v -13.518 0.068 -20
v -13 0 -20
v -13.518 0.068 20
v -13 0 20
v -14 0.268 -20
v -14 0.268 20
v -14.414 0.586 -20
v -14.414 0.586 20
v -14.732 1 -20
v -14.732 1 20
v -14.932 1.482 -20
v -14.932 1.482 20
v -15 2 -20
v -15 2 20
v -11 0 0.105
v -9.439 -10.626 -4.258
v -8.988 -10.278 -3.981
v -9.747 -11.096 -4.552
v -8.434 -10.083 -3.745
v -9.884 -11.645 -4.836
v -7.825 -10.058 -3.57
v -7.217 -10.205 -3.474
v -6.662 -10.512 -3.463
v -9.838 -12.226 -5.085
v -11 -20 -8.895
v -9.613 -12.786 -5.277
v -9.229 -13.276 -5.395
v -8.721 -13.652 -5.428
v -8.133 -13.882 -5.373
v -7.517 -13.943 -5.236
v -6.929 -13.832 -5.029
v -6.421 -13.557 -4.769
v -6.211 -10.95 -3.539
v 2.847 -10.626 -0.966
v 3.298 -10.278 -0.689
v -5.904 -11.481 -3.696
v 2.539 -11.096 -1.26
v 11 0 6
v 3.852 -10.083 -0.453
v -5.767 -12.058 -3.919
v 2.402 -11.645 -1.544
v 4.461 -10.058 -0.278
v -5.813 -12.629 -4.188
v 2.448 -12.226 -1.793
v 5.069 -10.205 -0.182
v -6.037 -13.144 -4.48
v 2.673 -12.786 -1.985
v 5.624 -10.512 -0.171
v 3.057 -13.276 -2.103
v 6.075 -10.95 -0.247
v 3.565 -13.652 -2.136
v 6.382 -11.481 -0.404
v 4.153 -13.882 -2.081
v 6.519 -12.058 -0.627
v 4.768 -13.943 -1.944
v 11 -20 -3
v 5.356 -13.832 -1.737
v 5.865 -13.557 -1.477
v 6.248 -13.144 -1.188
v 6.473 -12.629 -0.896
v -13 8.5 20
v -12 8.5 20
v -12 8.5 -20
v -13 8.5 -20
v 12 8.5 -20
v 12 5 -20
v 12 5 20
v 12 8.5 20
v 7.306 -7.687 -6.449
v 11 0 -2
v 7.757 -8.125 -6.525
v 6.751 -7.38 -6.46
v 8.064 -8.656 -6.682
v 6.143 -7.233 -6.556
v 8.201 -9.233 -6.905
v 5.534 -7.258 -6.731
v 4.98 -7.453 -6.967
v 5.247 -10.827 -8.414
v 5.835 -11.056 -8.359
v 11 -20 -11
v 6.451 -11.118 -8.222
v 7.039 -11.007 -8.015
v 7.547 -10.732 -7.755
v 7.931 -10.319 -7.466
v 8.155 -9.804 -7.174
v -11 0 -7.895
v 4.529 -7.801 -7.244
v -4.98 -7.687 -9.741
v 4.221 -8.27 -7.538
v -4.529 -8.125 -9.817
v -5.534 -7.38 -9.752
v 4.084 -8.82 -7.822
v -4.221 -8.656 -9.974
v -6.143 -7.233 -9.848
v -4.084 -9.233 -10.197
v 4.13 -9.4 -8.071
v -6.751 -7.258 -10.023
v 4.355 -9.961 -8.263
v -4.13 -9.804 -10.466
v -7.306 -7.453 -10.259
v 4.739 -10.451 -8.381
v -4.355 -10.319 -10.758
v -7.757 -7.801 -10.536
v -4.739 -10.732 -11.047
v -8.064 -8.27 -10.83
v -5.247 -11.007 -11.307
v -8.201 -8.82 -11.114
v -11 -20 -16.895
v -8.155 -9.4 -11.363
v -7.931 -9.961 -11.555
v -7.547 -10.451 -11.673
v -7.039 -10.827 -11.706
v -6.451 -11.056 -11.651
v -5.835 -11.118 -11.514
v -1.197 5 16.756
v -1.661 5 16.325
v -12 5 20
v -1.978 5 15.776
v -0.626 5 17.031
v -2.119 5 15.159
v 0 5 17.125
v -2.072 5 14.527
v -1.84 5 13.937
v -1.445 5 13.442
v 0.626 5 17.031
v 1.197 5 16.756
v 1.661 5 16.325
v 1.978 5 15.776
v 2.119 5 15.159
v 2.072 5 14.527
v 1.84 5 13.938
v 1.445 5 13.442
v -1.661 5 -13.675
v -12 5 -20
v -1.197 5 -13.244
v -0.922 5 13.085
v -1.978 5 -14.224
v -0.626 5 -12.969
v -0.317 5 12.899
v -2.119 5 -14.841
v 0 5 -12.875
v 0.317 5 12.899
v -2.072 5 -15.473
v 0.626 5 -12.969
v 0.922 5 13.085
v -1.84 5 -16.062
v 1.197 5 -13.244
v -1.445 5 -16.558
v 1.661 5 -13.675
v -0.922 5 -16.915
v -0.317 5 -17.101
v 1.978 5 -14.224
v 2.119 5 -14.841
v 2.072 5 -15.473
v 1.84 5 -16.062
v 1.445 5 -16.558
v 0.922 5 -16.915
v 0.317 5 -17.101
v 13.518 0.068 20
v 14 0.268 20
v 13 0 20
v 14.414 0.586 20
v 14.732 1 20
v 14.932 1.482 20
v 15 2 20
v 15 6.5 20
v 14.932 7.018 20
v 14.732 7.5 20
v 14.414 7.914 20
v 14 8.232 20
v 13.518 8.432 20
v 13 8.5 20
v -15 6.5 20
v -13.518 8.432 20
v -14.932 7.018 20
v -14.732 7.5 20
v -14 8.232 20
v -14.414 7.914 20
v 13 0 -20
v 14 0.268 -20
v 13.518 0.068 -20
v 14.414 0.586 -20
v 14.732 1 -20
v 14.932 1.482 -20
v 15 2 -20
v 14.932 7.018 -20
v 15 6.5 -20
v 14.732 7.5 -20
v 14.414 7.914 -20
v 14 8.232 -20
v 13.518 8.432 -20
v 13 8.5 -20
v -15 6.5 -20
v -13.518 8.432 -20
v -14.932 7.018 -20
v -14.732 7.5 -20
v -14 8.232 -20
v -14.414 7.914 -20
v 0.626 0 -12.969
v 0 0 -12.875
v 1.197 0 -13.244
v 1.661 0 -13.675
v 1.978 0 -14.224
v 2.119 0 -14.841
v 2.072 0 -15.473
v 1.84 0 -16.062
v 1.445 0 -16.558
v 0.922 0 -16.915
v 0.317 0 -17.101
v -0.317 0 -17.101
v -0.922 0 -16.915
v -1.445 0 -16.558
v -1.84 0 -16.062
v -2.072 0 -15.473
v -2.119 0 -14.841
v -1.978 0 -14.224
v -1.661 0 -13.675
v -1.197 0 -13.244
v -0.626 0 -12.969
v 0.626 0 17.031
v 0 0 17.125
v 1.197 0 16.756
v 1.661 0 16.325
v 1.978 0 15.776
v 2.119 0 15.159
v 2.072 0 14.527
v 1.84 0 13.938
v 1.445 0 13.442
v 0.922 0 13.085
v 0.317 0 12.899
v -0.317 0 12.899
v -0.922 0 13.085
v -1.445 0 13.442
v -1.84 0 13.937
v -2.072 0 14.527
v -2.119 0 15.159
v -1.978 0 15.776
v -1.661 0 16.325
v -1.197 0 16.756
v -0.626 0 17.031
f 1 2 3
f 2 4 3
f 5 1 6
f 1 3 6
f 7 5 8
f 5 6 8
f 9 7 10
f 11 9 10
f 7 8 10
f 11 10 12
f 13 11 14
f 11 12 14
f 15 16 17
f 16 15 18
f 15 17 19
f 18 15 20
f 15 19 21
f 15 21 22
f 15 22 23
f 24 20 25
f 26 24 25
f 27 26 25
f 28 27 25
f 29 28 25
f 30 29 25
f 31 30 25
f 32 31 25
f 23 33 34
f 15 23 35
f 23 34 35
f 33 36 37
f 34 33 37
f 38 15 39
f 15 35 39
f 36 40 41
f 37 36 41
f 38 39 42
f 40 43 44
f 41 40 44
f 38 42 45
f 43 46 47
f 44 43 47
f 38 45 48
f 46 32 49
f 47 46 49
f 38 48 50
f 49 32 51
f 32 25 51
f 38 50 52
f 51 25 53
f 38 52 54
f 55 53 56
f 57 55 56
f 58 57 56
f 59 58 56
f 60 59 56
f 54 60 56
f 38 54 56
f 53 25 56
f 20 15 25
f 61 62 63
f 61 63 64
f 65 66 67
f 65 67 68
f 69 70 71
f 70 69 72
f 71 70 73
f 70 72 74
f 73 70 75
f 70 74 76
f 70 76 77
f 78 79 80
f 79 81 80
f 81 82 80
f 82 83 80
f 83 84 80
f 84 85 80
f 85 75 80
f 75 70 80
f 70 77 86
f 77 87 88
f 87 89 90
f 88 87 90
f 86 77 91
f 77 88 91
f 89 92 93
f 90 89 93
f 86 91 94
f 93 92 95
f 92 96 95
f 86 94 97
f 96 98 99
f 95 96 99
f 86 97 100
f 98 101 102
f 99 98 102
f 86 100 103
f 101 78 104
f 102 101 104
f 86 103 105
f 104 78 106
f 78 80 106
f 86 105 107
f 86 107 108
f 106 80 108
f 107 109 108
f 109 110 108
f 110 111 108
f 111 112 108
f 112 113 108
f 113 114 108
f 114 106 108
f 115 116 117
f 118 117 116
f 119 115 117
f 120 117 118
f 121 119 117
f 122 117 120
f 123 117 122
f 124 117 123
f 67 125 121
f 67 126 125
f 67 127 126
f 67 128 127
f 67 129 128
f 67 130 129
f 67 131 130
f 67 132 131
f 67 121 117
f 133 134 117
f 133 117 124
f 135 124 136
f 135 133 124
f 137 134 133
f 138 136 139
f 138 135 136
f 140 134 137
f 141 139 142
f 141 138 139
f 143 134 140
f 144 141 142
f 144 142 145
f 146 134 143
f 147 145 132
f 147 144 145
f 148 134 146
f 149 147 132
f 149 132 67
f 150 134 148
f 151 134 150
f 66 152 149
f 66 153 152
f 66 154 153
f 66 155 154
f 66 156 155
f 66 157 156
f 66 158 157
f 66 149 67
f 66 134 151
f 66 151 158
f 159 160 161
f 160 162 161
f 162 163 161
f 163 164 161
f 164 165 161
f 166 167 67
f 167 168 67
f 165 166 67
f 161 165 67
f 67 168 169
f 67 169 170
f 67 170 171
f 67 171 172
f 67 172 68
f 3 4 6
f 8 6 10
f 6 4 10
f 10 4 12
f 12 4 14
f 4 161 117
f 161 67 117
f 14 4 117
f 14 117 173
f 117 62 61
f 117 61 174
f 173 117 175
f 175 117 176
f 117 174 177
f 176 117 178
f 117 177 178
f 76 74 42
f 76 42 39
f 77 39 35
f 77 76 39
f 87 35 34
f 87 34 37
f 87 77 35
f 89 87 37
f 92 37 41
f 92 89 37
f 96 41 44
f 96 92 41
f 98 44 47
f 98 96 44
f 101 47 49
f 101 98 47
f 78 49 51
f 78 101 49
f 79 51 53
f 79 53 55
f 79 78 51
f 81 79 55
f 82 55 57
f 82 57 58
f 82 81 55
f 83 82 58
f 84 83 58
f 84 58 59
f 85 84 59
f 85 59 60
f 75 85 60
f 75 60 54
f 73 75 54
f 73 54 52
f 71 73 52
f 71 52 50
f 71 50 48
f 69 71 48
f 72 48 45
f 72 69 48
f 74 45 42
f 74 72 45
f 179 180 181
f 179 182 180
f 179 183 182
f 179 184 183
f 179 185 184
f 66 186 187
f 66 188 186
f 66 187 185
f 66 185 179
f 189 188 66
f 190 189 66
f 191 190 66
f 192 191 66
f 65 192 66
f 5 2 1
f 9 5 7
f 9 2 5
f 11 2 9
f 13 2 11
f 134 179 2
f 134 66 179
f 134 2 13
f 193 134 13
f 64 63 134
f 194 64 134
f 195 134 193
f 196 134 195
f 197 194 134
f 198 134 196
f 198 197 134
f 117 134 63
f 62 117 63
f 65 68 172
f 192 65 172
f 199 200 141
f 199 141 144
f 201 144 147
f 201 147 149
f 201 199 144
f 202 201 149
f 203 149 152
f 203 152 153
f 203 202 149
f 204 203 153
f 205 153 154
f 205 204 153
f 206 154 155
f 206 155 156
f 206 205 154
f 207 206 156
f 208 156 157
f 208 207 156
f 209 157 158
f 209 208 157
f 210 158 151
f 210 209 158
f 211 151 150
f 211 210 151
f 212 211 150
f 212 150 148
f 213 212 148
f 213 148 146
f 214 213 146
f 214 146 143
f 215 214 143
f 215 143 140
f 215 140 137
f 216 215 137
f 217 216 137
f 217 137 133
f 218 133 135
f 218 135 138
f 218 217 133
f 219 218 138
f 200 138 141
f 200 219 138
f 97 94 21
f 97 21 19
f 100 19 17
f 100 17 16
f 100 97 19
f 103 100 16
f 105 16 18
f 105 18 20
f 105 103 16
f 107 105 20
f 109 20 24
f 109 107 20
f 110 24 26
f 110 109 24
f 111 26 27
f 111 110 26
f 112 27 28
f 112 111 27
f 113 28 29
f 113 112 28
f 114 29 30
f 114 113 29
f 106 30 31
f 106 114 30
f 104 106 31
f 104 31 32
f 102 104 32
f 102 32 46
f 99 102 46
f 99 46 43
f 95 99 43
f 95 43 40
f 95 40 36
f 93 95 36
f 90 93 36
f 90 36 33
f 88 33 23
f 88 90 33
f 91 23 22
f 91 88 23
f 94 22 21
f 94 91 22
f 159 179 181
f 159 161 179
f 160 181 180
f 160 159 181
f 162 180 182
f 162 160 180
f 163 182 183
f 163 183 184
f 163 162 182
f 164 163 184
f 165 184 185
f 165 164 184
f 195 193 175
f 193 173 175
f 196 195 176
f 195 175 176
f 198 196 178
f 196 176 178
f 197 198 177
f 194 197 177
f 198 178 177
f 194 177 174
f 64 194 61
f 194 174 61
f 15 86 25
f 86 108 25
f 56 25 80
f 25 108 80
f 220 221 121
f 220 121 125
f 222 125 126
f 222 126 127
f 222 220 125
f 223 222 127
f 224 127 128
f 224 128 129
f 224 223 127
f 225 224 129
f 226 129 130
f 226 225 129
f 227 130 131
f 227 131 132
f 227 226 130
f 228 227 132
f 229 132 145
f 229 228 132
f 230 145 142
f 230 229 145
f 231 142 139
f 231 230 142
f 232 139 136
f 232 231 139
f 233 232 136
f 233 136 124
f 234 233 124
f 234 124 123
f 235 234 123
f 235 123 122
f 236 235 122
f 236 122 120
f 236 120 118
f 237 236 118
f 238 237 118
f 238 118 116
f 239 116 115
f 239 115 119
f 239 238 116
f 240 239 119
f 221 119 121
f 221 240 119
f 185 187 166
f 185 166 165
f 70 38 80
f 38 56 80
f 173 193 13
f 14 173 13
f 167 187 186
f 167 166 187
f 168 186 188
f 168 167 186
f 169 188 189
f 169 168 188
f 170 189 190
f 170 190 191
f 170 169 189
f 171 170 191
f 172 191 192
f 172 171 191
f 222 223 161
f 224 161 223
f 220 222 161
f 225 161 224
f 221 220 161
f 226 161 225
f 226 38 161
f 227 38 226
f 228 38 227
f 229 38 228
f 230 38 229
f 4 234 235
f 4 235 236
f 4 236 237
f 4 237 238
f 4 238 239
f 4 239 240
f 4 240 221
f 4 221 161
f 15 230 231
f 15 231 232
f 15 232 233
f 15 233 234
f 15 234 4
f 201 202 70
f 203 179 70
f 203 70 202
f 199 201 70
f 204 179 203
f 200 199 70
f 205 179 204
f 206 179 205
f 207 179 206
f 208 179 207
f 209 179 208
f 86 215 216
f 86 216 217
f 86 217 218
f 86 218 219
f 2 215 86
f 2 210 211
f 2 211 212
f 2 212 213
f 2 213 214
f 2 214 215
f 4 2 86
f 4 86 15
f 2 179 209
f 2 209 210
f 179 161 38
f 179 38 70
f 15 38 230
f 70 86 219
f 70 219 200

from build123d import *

# Parameters (mm, degrees)
SKETCH1_W           = 22
SKETCH1_H           = 40
SKETCH1_R           = 2.125
BOSS_EXTRUDE1_DEPTH = 5
BOSS_EXTRUDE3_DEPTH = 40
FILLET1_R           = 2
SKETCH6_R           = 2.125
CUT_EXTRUDE1_DEPTH  = 7.086873748


with BuildPart() as part:
    # Sketch1 → Boss-Extrude1 (new body)
    with BuildSketch(Plane(origin=(0, 0, 0), x_dir=(1, 0, 0), z_dir=(0, 1, 0))):
        Rectangle(SKETCH1_W, SKETCH1_H)
        with Locations(Location((0, 15, 0), (0, 0, 270))):
            Circle(SKETCH1_R, mode=Mode.SUBTRACT)
        with Locations(Location((0, -15, 0), (0, 0, 270))):
            Circle(SKETCH1_R, mode=Mode.SUBTRACT)
    extrude(amount=BOSS_EXTRUDE1_DEPTH)

    # Sketch4 → Boss-Extrude3 (add)
    with BuildSketch(Plane(origin=(0, 0, -20), x_dir=(-1, 0, 0), z_dir=(0, 0, -1))):
        Polygon((-11, 5), (-12, 5), (-12, 8.5), (-15, 8.5), (-15, 0), (-11, 0), align=None)
        Polygon((11, 0), (11, 5), (12, 5), (12, 8.5), (15, 8.5), (15, 0), align=None)
    extrude(amount=-BOSS_EXTRUDE3_DEPTH)

    # Fillet1
    fillet1_edges = [part.edges().sort_by_distance(p)[0] for p in [
        (15, 0, 0),
        (15, 8.5, 0),
        (-15, 0, 0),
        (-15, 8.5, 0),
    ]]
    fillet(fillet1_edges, radius=FILLET1_R)

    # Sketch2 → Loft1 section 0
    with BuildSketch(Plane.XZ):
        with BuildLine():
            Line((-11, 0.105117767), (11, 6))
            Line((11, 6), (11, -2))
            Line((11, -2), (-11, -7.894882233))
            Line((-11, -7.894882233), (-11, 0.105117767))
        make_face()
    # Sketch5 → Loft1 section 1
    with BuildSketch(Plane(origin=(0, -20, 0), x_dir=(-1, 0, 0), z_dir=(0, -1, 0))):
        with BuildLine():
            Line((-11, 3), (-11, 11))
            Line((-11, 11), (11, 16.894882233))
            Line((11, 16.894882233), (11, 8.894882233))
            Line((11, 8.894882233), (-11, 3))
        make_face()
    loft()

    # Sketch6 → Cut-Extrude1 (cut)
    with BuildSketch(Plane(origin=(1.040309356, 1.747119317, -3.882487372), x_dir=(0.9714204714250083, -0.09740631922929449, 0.21645848717621435), z_dir=(-0.2373652621939752, -0.3986366483069059, 0.8858592184598079))):
        with Locations(Location((5.252708211, -11.411685947, 0), (0, 0, 90))):
            Circle(SKETCH6_R)
        with Locations(Location((-7.39453945, -12.762593713, 0), (0, 0, 90))):
            Circle(SKETCH6_R)
    extrude(amount=CUT_EXTRUDE1_DEPTH, mode=Mode.SUBTRACT)


solid = part.part
